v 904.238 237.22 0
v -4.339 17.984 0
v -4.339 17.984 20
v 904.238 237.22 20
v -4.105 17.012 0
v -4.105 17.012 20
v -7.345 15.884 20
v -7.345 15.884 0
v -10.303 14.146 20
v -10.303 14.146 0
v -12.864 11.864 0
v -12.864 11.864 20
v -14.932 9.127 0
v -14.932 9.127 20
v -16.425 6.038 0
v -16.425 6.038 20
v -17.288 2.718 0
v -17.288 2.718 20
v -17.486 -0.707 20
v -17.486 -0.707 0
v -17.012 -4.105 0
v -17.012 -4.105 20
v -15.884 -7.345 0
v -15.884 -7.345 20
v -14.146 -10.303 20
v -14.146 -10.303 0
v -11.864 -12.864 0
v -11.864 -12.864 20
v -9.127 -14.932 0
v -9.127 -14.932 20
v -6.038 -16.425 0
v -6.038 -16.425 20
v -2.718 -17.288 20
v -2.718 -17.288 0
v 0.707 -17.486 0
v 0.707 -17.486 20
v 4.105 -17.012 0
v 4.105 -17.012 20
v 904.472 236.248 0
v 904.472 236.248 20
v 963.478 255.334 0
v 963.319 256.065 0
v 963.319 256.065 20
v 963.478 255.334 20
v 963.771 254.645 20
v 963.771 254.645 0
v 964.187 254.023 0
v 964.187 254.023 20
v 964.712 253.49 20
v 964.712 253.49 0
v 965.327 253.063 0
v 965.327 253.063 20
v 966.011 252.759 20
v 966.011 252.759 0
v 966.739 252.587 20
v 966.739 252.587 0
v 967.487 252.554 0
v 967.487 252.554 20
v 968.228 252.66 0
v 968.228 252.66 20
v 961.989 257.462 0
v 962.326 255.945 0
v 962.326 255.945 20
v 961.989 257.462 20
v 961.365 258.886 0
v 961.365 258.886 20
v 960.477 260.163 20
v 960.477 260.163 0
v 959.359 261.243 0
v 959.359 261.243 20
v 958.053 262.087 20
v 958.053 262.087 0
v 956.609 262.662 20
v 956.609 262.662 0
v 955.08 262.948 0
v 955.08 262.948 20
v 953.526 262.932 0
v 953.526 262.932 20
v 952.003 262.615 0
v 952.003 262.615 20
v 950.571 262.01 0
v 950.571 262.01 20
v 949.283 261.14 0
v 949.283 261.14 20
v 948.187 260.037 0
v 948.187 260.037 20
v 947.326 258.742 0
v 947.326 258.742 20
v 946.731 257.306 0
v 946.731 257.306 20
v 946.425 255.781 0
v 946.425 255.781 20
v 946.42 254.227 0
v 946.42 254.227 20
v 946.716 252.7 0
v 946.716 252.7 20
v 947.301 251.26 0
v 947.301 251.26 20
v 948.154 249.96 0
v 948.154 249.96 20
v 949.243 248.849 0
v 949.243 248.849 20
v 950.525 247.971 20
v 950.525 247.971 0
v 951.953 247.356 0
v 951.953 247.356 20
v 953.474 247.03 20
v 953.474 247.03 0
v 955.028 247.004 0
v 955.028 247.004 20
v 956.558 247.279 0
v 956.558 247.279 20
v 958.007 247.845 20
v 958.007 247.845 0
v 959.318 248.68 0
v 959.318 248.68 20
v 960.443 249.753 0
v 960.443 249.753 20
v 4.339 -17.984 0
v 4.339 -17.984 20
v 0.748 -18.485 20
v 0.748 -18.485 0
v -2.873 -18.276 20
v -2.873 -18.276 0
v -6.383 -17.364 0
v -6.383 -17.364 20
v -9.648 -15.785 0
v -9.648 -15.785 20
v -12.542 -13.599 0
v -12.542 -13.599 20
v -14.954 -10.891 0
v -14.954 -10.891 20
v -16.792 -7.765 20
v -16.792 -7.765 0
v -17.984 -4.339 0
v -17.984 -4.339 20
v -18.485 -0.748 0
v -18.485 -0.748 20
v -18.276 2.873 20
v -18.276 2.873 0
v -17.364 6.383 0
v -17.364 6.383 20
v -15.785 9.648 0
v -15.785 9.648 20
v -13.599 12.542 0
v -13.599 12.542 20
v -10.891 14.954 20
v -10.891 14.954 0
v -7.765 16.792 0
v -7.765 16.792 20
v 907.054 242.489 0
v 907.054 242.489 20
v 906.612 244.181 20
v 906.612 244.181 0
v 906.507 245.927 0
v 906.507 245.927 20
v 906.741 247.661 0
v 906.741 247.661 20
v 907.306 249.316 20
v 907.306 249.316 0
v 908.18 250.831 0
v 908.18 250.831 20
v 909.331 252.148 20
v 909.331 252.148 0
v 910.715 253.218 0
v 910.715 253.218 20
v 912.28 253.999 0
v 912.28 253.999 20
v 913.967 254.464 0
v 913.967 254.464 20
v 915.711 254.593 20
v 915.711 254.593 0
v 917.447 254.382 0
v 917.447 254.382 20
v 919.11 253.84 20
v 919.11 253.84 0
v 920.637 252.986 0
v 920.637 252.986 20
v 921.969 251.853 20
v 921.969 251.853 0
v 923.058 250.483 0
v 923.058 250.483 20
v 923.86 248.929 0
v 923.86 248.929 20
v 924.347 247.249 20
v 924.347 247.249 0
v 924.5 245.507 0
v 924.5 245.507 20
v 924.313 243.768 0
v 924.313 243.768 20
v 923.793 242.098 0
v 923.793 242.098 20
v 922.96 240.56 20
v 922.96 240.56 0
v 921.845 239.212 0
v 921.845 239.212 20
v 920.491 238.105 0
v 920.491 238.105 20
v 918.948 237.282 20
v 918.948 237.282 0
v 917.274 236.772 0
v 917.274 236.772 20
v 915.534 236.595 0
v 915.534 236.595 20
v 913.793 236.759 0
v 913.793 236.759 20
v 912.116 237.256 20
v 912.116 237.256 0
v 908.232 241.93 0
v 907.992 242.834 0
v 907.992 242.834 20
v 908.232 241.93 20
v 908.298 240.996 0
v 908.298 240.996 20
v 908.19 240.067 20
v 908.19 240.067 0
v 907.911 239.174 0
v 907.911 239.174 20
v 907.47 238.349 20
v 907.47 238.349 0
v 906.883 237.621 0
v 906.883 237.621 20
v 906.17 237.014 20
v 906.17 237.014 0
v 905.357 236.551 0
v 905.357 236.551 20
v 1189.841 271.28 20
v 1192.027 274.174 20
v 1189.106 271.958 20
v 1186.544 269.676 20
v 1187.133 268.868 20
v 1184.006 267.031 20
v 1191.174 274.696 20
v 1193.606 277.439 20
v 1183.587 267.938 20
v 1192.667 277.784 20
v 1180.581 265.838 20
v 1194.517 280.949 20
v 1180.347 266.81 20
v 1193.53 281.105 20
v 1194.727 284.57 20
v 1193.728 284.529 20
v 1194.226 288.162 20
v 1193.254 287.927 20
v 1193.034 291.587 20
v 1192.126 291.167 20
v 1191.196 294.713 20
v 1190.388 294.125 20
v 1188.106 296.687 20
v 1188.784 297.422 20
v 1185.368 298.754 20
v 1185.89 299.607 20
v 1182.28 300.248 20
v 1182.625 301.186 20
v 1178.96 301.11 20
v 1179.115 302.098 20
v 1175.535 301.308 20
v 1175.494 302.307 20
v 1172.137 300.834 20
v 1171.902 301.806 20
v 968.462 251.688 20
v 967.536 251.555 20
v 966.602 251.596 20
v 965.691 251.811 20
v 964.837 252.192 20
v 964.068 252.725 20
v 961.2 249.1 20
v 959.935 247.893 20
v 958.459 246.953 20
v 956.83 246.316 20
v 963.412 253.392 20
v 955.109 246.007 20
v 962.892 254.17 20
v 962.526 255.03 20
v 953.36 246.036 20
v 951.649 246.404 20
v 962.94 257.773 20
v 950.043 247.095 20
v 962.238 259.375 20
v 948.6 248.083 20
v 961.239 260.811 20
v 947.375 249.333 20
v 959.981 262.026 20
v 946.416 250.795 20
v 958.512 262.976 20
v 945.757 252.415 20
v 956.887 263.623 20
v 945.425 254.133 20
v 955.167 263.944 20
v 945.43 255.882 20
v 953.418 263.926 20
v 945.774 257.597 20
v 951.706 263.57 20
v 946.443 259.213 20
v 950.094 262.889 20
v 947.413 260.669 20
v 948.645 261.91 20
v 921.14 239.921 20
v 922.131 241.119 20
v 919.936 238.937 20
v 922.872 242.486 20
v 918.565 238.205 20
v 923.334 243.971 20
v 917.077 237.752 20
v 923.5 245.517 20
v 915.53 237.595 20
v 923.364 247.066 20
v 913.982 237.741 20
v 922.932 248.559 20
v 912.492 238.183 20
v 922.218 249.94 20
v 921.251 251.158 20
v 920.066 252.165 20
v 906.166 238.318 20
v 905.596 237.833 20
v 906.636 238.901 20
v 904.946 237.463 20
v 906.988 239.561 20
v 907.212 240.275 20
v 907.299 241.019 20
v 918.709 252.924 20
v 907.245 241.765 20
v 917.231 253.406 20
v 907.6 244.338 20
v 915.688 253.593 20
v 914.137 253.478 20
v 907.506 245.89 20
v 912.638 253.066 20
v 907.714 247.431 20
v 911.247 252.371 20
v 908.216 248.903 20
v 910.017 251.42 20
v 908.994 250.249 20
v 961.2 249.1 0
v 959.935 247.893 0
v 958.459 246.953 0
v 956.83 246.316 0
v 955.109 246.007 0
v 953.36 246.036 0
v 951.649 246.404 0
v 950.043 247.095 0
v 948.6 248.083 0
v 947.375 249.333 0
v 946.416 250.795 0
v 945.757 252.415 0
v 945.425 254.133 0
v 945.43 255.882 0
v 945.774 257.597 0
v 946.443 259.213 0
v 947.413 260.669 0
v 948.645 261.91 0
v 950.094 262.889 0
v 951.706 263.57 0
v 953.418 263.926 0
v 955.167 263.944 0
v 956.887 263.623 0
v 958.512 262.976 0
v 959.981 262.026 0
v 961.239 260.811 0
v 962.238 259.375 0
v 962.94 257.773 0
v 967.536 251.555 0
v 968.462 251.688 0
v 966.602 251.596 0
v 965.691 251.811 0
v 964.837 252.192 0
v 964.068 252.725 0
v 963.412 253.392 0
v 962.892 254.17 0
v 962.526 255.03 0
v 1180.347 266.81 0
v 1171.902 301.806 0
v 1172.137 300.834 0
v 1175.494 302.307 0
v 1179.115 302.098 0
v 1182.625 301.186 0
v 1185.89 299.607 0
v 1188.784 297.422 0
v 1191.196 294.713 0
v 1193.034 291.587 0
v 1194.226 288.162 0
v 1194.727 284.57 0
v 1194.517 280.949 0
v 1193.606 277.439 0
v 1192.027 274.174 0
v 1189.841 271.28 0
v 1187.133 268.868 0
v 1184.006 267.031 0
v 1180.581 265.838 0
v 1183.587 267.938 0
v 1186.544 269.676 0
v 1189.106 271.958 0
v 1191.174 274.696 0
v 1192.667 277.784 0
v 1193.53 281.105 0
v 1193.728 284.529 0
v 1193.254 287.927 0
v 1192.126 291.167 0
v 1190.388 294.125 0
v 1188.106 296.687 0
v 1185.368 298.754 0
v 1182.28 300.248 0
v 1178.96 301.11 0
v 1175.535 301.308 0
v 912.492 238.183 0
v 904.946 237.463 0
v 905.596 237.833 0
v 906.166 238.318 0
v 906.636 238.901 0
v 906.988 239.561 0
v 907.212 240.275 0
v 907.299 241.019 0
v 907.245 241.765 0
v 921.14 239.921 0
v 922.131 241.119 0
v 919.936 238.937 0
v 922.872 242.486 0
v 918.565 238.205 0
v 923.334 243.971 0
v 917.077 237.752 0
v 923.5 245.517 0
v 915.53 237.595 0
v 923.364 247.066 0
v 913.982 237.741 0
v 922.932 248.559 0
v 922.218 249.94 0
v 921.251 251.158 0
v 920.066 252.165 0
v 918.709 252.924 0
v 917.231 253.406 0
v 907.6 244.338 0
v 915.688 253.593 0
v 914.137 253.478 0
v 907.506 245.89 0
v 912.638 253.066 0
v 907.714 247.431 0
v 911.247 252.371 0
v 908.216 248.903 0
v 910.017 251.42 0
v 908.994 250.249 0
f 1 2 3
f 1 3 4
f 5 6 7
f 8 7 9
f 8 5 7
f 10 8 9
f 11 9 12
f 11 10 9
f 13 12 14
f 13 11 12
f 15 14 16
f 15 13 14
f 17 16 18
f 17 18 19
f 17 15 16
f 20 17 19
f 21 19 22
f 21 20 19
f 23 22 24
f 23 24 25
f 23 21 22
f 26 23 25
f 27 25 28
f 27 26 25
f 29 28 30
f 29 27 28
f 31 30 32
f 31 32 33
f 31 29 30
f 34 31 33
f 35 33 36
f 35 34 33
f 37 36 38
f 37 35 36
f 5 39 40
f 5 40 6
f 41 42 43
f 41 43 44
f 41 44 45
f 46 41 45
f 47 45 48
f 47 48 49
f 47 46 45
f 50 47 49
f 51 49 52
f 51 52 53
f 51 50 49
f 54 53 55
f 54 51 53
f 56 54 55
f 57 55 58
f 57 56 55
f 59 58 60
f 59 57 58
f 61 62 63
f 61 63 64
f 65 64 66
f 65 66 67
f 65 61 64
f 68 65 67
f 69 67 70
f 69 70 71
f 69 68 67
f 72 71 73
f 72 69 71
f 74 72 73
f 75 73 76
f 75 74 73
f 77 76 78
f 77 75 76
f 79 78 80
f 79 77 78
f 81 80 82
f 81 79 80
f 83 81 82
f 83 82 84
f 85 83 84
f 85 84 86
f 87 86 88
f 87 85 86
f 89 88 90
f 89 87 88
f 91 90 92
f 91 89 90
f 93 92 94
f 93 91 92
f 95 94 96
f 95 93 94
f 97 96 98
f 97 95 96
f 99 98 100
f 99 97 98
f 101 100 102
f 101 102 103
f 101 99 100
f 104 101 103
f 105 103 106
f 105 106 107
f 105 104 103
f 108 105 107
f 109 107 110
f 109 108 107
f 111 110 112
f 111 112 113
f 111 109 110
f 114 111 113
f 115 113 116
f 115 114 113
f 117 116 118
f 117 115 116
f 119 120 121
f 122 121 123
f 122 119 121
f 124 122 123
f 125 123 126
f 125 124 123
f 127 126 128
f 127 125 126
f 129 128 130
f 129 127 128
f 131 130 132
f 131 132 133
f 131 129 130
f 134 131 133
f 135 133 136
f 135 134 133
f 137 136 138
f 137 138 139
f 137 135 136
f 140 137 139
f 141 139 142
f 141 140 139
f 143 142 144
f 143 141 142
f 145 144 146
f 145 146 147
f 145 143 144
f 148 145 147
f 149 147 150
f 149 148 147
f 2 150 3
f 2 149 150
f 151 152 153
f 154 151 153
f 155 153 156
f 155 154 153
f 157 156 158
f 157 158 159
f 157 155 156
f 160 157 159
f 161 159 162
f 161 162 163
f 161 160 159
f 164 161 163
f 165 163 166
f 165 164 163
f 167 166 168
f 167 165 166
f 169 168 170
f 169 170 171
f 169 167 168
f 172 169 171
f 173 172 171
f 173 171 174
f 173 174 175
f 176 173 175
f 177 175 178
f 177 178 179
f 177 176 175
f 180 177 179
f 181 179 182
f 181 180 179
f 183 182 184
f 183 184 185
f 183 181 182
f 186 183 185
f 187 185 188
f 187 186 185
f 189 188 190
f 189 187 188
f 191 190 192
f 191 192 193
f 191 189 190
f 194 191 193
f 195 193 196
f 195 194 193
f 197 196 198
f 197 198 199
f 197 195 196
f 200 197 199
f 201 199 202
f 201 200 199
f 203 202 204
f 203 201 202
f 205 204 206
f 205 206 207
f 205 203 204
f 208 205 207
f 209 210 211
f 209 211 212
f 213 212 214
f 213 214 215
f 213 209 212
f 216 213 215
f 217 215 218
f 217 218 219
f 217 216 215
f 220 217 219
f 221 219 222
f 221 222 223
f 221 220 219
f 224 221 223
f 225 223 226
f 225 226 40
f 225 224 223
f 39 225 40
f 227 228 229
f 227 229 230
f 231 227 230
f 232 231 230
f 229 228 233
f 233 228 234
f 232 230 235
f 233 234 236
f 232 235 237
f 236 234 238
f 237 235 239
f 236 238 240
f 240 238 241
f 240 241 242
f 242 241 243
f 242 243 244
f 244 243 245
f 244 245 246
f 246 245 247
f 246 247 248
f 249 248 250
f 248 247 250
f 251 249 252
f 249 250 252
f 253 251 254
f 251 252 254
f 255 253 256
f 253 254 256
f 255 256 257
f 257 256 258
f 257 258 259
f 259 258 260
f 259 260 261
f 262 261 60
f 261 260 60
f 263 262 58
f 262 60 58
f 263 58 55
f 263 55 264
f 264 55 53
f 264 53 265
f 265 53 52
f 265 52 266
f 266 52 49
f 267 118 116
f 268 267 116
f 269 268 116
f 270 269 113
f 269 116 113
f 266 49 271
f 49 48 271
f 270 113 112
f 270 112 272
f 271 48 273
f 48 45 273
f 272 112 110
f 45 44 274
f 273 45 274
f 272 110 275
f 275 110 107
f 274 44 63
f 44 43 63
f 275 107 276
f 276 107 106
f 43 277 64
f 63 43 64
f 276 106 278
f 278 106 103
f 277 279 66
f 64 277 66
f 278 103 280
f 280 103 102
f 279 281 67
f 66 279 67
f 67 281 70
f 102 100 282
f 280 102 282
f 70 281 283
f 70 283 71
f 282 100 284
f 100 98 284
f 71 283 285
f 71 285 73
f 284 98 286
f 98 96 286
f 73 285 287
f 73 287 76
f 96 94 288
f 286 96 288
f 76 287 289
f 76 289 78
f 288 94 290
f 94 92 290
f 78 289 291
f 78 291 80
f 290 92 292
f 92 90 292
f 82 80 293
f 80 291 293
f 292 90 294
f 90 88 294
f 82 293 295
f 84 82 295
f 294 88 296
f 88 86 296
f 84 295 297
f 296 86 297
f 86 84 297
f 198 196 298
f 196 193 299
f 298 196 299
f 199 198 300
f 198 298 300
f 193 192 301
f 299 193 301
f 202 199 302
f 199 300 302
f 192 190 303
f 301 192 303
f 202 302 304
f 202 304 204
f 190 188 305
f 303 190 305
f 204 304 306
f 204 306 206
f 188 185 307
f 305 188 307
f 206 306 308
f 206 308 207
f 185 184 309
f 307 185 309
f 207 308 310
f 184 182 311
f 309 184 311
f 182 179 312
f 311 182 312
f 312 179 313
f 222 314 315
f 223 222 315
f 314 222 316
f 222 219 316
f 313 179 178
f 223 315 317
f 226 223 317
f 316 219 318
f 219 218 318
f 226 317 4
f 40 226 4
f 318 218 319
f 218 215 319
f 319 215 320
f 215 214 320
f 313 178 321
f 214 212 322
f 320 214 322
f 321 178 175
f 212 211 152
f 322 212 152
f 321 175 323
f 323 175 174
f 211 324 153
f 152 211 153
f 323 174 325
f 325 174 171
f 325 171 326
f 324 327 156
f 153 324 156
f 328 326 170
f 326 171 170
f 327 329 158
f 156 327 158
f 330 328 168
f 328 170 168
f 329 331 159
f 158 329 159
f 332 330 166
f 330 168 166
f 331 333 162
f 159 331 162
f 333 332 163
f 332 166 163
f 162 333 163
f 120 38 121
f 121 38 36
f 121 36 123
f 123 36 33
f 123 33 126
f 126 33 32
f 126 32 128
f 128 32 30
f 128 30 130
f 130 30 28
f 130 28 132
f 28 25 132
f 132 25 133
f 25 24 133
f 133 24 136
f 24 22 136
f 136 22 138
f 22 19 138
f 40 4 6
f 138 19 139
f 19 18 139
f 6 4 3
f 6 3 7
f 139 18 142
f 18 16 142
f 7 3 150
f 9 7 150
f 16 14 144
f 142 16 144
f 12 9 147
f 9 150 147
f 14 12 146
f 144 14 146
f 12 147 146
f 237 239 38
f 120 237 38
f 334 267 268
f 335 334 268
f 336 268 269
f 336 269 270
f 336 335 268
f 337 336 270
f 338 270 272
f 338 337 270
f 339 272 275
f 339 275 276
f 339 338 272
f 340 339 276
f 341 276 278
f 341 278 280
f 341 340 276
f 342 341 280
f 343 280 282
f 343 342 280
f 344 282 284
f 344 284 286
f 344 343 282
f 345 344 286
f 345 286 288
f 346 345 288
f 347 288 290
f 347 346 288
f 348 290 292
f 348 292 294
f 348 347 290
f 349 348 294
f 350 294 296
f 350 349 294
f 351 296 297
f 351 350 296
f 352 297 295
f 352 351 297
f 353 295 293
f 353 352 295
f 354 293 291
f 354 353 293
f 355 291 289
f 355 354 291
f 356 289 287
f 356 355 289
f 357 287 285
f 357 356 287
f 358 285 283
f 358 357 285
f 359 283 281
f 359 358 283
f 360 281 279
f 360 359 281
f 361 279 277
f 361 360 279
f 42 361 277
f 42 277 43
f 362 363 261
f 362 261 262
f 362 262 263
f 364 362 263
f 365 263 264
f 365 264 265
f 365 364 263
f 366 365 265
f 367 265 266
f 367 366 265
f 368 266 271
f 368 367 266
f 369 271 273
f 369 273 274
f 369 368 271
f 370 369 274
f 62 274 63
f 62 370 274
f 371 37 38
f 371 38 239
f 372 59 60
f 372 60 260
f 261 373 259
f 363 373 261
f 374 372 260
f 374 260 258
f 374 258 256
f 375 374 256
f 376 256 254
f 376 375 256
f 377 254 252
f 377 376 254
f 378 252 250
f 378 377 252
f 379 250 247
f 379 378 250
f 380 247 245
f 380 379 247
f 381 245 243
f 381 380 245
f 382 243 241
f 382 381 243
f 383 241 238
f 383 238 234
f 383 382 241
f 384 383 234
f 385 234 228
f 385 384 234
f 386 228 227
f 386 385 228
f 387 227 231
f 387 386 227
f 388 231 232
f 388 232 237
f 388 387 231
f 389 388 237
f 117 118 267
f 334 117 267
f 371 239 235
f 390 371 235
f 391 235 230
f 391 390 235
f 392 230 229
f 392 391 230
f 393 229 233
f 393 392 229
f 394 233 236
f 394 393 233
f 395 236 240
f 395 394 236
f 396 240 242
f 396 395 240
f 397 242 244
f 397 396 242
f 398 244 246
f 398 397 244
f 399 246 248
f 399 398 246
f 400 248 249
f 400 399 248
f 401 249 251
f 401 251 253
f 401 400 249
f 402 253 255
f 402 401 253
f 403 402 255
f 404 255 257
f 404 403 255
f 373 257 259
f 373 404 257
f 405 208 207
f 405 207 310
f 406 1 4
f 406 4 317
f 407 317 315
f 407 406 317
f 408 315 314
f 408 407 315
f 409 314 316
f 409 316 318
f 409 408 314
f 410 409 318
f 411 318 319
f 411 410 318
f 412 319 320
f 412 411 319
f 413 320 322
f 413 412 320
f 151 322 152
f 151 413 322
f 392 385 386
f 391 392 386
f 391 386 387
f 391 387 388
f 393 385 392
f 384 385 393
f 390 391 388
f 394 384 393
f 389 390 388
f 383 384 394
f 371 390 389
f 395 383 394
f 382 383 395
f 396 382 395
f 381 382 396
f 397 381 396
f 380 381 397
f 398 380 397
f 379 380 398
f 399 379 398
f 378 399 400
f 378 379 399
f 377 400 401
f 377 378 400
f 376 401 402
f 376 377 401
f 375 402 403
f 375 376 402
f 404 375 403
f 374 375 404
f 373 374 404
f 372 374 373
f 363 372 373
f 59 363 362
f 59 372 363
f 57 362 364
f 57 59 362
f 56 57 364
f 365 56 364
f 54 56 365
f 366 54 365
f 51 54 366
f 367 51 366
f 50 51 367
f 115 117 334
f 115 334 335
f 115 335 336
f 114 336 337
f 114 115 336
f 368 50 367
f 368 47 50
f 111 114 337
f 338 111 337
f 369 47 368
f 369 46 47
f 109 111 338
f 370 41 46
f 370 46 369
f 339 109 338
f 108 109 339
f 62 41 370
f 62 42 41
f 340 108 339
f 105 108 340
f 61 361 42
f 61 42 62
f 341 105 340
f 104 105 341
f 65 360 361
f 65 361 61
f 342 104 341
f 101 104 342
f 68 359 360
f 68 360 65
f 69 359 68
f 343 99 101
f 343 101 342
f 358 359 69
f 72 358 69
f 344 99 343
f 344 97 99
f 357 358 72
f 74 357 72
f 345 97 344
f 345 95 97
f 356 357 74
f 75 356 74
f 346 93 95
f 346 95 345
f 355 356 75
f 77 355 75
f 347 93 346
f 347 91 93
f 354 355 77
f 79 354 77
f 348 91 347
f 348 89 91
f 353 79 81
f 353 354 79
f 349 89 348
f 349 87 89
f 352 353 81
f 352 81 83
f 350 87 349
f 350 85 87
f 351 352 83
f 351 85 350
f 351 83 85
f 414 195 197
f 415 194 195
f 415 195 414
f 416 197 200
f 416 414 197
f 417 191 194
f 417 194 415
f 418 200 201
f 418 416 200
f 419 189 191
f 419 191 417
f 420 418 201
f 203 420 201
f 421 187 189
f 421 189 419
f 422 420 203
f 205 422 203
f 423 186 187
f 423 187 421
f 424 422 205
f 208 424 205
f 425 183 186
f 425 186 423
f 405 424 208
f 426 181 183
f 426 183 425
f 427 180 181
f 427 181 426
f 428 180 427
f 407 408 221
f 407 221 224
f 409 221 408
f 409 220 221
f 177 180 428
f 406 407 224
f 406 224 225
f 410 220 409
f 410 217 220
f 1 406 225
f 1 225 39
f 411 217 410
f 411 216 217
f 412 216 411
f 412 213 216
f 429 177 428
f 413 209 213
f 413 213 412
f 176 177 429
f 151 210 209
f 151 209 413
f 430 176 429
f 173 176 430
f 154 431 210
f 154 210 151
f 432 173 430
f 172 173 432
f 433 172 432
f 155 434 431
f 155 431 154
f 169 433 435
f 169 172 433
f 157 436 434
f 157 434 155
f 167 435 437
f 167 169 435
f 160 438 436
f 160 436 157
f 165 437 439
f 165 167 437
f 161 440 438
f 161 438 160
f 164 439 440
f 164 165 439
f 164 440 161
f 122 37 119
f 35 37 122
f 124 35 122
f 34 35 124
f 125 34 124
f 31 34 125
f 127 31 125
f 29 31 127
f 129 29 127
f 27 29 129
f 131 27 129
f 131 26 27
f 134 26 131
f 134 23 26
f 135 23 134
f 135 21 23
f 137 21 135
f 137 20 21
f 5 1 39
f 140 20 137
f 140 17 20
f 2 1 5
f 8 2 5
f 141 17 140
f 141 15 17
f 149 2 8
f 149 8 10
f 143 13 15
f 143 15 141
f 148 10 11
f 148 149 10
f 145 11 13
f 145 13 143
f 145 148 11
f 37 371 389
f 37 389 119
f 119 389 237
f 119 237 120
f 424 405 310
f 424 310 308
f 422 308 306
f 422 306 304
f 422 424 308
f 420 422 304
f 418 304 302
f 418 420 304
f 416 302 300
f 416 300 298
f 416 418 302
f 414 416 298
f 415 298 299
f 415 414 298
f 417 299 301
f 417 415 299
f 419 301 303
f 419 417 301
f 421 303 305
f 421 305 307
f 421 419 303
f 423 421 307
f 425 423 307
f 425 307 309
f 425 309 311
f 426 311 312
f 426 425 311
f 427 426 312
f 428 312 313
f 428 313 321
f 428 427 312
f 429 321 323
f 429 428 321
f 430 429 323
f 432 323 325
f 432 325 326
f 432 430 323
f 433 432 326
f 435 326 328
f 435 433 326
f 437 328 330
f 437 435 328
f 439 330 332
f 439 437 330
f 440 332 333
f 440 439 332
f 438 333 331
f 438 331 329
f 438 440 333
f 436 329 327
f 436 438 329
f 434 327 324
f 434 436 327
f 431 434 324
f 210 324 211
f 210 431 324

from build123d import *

# Parameters (mm, degrees)
EXTRUDE_1_DEPTH = 20


with BuildPart() as part:
    # Эскиз1 → Вытянуть-Тонкостенный1 (new body)
    with BuildSketch(Plane.XY):
        with BuildLine():
            ThreePointArc((912.491816875, 238.182711116), (921.250664821, 251.157512727), (907.99238472, 242.833997667))
            ThreePointArc((907.99238472, 242.833997667), (907.709433669, 238.751494744), (904.472489462, 236.247680931))
            Line((904.472489462, 236.247680931), (-4.104867197, 17.011762557))
            ThreePointArc((-4.104867197, 17.011762557), (-17.011762557, -4.104867197), (4.104867197, -17.011762557))
            Line((4.104867197, -17.011762557), (1180.346735421, 266.81048364))
            ThreePointArc((1180.346735421, 266.81048364), (1193.253630781, 287.927113394), (1172.137001027, 300.834008754))
            Line((1172.137001027, 300.834008754), (968.462324862, 251.688160741))
            ThreePointArc((968.462324862, 251.688160741), (964.439737623, 252.440279959), (962.326140621, 255.944505854))
            ThreePointArc((962.326140621, 255.944505854), (946.7309564, 257.30580058), (960.442997448, 249.753130556))
            Line((960.442997448, 249.753130556), (961.20027756, 249.100040338))
            ThreePointArc((961.20027756, 249.100040338), (945.774231381, 257.596794115), (963.318813629, 256.065337549))
            ThreePointArc((963.318813629, 256.065337549), (965.009691231, 253.261956833), (968.227761022, 252.660261458))
            Line((968.227761022, 252.660261458), (1171.902437187, 301.806109471))
            ThreePointArc((1171.902437187, 301.806109471), (1194.225731499, 288.161677234), (1180.581299261, 265.838382922))
            Line((1180.581299261, 265.838382922), (4.339431037, -17.983863275))
            ThreePointArc((4.339431037, -17.983863275), (-17.983863275, -4.339431037), (-4.339431037, 17.983863275))
            Line((-4.339431037, 17.983863275), (904.237925622, 237.219781649))
            ThreePointArc((904.237925622, 237.219781649), (906.827480988, 239.222832699), (907.053841829, 242.488835037))
            ThreePointArc((907.053841829, 242.488835037), (921.969406942, 251.852789481), (912.115703003, 237.256137668))
            Line((912.115703003, 237.256137668), (912.491816875, 238.182711116))
        make_face()
    extrude(amount=EXTRUDE_1_DEPTH)


solid = part.part
